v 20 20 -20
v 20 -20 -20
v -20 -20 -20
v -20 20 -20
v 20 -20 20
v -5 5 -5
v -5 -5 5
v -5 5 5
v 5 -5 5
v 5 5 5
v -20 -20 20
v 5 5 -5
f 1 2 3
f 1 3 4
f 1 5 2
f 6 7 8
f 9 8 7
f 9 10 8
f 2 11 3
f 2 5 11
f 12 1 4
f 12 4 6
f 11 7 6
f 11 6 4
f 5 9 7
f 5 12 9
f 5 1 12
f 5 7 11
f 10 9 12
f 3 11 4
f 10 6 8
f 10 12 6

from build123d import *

# Parameters (mm, degrees)
F1_DEPTH = 20
F2_DEPTH = 5


with BuildPart() as f1:
    # F0 (on Right) → F1 (new body, symmetric)
    with BuildSketch(Plane.YZ):
        Polygon((-5, 5), (-20, 20), (-20, -20), (20, -20), (5, -5), (-5, -5), align=None)
        Polygon((5, -5), (-5, 5), (-5, -5), align=None)
    extrude(amount=F1_DEPTH, both=True)

    # F0 (on Right) → F2 (join, symmetric)
    with BuildSketch(Plane.YZ):
        Polygon((5, 5), (-5, 5), (5, -5), align=None)
    extrude(amount=F2_DEPTH, both=True)


solid = f1.part
